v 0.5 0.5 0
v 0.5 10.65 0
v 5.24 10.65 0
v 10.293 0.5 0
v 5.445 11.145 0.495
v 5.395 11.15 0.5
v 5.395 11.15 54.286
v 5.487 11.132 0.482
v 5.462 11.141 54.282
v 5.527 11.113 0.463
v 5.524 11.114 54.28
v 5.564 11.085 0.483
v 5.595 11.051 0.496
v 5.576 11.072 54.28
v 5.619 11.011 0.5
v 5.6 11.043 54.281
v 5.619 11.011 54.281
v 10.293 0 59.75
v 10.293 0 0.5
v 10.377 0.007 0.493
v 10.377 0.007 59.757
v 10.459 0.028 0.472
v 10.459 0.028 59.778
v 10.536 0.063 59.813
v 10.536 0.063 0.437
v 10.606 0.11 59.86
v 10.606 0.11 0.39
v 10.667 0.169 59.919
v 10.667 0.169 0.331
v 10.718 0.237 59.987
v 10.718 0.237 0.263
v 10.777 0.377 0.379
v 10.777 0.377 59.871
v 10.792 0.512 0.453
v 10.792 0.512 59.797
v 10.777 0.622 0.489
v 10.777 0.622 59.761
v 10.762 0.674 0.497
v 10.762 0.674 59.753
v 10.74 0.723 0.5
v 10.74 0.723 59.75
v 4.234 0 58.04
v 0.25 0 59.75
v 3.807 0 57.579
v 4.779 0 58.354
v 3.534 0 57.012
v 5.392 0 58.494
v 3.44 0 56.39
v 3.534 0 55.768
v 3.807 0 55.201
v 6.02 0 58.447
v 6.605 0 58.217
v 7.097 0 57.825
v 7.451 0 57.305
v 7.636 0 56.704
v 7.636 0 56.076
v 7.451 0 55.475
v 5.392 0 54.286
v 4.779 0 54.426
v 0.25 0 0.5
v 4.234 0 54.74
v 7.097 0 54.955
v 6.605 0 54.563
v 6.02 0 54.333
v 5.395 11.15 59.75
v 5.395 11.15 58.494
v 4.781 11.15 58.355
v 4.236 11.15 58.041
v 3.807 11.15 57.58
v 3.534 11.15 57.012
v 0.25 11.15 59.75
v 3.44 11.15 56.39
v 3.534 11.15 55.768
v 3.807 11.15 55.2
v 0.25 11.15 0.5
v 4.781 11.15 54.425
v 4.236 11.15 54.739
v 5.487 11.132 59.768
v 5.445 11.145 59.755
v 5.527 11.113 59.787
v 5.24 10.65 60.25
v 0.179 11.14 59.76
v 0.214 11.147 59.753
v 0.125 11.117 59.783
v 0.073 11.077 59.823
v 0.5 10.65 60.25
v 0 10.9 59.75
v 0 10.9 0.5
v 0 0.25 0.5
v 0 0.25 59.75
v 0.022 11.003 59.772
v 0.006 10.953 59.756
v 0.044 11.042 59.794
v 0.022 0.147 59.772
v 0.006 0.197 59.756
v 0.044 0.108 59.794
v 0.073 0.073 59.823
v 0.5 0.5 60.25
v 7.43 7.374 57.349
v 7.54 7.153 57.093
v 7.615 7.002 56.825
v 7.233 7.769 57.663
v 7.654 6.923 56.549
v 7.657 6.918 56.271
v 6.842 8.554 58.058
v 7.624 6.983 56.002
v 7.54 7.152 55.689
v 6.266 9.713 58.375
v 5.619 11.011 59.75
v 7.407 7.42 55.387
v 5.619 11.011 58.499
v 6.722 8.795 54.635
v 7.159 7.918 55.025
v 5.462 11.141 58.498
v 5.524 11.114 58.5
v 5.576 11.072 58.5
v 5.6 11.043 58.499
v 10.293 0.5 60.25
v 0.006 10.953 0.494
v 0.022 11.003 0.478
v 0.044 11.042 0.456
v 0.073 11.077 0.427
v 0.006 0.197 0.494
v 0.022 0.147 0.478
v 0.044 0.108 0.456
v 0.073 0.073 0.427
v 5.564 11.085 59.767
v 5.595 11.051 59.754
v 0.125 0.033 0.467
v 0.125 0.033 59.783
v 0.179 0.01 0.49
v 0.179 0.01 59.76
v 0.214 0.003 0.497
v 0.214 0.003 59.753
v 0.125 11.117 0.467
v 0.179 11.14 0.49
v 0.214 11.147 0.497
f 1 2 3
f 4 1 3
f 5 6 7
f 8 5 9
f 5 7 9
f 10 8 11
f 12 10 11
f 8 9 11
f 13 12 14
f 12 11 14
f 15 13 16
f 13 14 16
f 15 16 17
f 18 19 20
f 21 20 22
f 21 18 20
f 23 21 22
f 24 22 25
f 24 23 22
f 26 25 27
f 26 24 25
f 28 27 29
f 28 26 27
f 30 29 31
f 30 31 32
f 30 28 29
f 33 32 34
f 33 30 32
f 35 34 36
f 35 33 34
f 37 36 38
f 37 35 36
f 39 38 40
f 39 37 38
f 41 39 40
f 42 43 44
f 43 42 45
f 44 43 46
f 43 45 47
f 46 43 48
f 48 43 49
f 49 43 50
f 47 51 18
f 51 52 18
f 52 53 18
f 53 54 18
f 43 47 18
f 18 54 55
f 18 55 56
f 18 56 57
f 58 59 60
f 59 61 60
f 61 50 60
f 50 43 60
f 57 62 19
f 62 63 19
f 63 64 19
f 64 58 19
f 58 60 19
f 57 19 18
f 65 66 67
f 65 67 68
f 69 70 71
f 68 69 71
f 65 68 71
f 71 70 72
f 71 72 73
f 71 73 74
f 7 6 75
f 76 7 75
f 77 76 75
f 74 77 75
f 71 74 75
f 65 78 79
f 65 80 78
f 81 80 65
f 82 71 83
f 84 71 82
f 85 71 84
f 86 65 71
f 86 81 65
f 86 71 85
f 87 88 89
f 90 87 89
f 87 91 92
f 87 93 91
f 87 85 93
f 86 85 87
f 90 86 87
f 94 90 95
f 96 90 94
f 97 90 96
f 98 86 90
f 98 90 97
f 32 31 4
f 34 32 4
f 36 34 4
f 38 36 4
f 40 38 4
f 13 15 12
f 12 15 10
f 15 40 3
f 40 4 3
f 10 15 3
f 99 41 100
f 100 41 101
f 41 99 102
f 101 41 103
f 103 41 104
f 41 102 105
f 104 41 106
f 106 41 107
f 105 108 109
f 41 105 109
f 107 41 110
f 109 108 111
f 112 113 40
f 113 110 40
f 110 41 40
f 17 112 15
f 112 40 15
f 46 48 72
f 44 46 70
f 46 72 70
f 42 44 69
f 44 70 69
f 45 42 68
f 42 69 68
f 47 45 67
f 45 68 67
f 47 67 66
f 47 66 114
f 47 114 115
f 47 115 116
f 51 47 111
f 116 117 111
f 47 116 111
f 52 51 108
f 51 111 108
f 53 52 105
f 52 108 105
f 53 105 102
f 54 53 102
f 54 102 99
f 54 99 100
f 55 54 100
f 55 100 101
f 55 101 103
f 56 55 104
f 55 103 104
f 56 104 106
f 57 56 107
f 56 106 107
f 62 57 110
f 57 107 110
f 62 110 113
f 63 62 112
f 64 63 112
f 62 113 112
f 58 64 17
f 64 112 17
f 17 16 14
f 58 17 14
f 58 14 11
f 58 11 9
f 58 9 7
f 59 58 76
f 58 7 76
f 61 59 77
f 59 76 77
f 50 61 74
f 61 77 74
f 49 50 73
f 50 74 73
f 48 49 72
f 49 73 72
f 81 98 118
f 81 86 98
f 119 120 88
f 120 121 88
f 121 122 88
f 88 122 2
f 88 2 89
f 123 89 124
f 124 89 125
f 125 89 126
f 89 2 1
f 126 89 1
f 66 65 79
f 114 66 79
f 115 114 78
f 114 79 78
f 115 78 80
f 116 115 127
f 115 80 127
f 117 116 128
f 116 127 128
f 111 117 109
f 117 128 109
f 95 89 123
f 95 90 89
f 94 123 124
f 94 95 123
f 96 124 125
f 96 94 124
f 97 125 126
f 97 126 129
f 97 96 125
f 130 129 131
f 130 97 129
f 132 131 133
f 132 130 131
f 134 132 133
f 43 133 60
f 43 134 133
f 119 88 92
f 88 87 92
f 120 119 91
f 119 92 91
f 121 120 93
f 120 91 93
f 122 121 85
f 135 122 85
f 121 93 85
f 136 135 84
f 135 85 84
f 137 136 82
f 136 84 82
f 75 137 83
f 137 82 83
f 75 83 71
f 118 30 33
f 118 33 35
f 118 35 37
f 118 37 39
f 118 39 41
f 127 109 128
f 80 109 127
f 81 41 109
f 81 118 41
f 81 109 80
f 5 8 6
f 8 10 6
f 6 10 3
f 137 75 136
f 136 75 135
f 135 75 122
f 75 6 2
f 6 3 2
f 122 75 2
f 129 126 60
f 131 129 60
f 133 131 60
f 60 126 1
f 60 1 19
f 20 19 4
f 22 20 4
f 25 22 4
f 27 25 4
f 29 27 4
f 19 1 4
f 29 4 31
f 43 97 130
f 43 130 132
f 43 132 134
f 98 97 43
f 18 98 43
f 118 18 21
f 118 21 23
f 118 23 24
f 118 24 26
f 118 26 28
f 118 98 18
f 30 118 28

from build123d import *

# Parameters (mm, degrees)
BASE_DEPTH        = 60.25
FACE_CHAMFER_SIZE = 0.5
SMALLER_FILLETS_R = 0.25
LARGER_FILLET_R   = 0.5
SKETCH2_R         = 2.11
HOLE_DEPTH        = 63.216278519


with BuildPart() as part:
    # Sketch1 → Base (new body)
    with BuildSketch(Plane.XY):
        Polygon((0, 11.15), (0, 0), (11.1, 0), (5.55, 11.15), align=None)
    extrude(amount=BASE_DEPTH)

    # Face Chamfer
    face_chamfer_edges = [part.edges().sort_by_distance(p)[0] for p in [
        (5.55, 0, 60.25),
        (8.325, 5.575, 60.25),
        (2.775, 11.15, 60.25),
        (8.325, 5.575, 0),
        (5.55, 0, 0),
        (0, 5.575, 0),
        (2.775, 11.15, 0),
        (0, 5.575, 60.25),
    ]]
    chamfer(face_chamfer_edges, length=FACE_CHAMFER_SIZE)

    # Smaller Fillets
    smaller_fillets_edges = [part.edges().sort_by_distance(p)[0] for p in [
        (0, 0, 30.125),
        (0, 11.15, 30.125),
        (5.55, 11.15, 30.125),
    ]]
    fillet(smaller_fillets_edges, radius=SMALLER_FILLETS_R)

    # Larger Fillet
    larger_fillet_edges = [part.edges().sort_by_distance(p)[0] for p in [
        (11.1, 0, 30.125),
    ]]
    fillet(larger_fillet_edges, radius=LARGER_FILLET_R)

    # Sketch2 → Hole (cut, through all)
    with BuildSketch(Plane(origin=(0, 11.15, 0), x_dir=(1, 0, 0), z_dir=(0, 1, 0))):
        with Locations(Location((5.55, -56.39, 0), (0, 0, 180))):
            Circle(SKETCH2_R)
    extrude(amount=-HOLE_DEPTH, mode=Mode.SUBTRACT)


solid = part.part
